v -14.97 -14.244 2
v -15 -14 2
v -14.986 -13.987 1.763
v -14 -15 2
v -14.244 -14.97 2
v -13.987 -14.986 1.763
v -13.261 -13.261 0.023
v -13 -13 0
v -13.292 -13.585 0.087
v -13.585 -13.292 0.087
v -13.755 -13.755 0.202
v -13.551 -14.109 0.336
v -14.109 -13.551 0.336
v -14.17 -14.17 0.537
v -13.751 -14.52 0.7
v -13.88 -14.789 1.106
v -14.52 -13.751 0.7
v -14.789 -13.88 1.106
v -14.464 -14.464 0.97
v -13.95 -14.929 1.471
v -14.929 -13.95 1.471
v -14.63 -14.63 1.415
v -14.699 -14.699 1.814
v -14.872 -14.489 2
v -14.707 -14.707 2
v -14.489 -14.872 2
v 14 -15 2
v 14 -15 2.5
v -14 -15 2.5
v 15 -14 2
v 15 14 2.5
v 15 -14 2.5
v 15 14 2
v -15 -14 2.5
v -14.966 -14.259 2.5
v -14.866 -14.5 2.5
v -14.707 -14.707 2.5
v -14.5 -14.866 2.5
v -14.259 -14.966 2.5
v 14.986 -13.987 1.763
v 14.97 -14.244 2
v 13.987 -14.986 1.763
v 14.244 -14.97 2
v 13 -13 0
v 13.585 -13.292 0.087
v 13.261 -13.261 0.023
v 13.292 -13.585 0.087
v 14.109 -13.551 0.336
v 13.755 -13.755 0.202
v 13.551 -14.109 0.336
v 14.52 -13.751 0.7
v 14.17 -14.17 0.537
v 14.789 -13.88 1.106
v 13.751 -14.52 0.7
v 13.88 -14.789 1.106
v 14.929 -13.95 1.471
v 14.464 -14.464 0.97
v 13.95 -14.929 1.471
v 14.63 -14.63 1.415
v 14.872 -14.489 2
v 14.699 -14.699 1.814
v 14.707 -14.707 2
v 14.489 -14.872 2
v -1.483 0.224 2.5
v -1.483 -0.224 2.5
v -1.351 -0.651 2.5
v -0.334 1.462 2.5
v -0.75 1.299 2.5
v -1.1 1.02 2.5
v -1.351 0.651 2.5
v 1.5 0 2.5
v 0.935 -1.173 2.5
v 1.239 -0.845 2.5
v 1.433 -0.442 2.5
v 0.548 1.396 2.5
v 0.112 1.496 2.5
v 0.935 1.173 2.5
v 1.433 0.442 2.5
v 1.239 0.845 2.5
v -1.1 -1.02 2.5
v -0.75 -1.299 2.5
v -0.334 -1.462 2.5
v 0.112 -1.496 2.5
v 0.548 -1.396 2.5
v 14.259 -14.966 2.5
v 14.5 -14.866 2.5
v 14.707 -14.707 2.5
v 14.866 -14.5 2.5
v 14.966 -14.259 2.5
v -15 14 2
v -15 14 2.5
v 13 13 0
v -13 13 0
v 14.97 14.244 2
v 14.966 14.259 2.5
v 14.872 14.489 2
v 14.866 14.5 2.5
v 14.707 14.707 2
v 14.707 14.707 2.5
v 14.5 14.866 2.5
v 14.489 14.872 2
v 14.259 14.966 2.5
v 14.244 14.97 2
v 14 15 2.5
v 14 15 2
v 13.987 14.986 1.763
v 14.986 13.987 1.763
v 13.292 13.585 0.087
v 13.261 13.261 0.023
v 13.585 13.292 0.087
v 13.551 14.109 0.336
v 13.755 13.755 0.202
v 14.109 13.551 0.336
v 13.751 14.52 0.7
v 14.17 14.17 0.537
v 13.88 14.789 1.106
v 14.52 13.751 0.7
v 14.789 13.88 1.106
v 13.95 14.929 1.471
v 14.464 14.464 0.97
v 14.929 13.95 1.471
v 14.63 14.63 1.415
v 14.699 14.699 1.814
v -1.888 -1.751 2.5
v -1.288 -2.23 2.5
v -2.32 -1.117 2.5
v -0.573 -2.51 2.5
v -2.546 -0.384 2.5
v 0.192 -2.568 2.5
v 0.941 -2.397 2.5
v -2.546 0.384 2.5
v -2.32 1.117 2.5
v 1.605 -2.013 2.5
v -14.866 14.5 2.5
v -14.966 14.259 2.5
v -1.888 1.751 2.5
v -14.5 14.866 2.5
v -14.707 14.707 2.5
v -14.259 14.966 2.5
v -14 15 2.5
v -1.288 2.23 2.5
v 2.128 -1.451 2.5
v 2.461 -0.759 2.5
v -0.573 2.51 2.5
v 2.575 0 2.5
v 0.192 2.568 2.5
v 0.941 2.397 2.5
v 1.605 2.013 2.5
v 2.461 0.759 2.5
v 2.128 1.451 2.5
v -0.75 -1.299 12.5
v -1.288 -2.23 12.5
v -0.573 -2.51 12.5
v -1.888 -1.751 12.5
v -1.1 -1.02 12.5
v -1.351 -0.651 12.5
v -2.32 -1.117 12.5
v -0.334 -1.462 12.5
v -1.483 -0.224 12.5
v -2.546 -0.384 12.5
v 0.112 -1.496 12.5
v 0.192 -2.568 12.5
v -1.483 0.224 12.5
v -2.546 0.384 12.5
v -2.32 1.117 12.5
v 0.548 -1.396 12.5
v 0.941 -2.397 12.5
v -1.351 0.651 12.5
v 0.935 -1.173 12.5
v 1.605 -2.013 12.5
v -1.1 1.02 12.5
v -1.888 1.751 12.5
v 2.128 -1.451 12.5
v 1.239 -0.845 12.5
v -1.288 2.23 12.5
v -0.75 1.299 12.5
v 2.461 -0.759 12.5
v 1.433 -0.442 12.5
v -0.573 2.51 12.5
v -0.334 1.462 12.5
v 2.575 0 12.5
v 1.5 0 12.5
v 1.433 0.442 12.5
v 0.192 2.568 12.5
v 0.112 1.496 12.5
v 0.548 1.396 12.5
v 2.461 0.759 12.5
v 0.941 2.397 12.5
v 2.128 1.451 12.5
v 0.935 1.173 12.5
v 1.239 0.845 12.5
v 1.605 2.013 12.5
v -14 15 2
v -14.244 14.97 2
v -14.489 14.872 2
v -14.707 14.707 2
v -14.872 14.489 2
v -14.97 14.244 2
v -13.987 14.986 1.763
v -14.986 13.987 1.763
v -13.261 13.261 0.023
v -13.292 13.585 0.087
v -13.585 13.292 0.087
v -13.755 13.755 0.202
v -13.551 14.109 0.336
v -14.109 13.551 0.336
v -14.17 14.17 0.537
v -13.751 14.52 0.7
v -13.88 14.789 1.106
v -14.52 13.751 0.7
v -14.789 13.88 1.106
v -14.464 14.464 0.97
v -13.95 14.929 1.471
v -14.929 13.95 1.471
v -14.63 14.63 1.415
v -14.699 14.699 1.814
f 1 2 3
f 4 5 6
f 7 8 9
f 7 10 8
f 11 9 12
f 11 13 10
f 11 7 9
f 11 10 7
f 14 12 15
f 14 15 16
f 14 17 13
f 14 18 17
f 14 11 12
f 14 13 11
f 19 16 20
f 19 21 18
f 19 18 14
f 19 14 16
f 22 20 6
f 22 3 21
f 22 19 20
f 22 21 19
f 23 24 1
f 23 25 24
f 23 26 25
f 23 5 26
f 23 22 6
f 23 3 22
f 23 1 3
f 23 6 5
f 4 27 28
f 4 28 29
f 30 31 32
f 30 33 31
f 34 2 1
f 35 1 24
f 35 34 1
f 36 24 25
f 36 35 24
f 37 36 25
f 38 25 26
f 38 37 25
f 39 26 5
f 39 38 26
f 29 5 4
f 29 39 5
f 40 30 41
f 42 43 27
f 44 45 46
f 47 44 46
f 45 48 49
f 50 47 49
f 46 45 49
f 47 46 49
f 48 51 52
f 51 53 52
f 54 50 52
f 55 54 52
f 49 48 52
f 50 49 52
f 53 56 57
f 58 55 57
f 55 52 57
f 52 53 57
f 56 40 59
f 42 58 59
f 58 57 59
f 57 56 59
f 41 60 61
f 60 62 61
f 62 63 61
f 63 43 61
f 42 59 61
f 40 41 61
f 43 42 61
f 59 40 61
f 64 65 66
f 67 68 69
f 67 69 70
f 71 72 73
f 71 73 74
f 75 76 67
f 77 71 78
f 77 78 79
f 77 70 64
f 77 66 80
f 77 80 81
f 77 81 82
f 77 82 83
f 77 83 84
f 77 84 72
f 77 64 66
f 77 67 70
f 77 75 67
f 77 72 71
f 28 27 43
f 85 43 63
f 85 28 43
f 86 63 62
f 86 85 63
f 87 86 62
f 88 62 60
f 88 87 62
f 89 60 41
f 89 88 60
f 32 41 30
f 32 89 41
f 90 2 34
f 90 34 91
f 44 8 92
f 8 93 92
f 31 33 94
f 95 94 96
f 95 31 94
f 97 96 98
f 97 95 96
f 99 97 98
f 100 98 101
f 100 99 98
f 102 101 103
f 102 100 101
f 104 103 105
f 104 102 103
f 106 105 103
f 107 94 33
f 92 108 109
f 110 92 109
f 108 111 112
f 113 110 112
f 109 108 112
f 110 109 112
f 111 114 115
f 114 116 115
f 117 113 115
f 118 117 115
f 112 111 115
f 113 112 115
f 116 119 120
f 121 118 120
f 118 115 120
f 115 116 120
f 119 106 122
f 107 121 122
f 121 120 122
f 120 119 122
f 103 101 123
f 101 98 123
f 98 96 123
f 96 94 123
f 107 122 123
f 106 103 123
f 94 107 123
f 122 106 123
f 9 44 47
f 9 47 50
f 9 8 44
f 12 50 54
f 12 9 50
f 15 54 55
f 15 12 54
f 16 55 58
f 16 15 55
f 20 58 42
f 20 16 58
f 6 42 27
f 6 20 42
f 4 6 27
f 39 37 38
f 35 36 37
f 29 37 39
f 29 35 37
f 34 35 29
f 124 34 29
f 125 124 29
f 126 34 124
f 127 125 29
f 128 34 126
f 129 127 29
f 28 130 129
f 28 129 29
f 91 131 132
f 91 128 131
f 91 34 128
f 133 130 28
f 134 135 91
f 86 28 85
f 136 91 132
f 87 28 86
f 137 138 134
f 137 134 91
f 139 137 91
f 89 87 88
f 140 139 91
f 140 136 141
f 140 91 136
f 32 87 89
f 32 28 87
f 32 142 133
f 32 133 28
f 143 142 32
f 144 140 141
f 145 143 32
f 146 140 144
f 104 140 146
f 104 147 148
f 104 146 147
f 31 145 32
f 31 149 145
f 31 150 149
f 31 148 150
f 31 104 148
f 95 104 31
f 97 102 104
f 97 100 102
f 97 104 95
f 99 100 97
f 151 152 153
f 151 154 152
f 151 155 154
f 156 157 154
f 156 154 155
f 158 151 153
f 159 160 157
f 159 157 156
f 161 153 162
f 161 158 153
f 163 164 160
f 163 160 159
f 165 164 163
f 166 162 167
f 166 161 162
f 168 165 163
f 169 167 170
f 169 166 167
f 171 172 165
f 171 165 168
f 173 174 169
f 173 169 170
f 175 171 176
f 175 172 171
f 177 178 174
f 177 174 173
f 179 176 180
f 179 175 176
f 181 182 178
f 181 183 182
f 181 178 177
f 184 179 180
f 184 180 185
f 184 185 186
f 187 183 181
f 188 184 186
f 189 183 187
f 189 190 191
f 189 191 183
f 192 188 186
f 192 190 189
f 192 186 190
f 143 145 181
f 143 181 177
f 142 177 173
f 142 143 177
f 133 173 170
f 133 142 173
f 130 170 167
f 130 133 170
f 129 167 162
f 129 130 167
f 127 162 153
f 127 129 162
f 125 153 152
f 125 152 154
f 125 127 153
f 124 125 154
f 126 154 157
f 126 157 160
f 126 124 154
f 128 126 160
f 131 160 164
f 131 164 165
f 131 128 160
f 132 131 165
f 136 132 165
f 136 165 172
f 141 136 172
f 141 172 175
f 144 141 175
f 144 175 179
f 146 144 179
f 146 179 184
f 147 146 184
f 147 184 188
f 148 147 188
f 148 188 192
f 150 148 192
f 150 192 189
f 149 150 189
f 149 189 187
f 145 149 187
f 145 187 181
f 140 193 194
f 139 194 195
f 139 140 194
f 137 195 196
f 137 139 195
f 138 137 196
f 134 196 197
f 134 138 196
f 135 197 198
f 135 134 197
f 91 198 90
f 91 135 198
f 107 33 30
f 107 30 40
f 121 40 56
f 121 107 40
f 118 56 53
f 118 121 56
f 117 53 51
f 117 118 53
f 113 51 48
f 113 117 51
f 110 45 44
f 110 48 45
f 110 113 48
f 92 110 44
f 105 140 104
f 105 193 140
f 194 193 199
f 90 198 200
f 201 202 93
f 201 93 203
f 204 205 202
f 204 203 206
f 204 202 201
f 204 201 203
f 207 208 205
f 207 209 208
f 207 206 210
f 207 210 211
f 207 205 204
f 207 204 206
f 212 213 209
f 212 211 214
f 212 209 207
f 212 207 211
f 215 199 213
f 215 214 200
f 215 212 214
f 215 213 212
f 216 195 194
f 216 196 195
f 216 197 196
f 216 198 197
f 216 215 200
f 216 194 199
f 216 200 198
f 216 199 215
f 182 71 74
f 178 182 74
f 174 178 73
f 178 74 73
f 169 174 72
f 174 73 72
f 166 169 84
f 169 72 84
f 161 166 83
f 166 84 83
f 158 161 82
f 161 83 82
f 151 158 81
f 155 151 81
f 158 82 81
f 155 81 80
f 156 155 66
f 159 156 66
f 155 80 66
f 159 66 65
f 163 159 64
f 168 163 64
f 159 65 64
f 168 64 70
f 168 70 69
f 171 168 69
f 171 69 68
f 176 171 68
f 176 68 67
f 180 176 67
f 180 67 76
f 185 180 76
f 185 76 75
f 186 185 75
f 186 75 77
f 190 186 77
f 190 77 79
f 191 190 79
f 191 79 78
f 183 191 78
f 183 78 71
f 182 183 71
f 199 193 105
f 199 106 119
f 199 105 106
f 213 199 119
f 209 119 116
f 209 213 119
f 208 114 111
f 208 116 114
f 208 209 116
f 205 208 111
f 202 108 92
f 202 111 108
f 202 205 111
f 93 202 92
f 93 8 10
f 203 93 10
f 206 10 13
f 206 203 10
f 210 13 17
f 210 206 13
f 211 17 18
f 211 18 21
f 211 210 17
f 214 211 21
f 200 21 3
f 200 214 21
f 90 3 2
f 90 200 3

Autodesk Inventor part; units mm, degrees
ref_plane "YZ Plane" through (0, 0, 0) normal (1, 0, 0) x (0, 1, 0)
ref_plane "XZ Plane" through (0, 0, 0) normal (0, 1, 0) x (-1, 0, 0)
ref_plane "XY Plane" through (0, 0, 0) normal (0, 0, 1) x (1, 0, 0)
sketch "Náčrt1" plane through (0, 0, 0) normal (0, 0, 1) x (1, 0, 0)
  line L0 (0, 21) -> (0, -21) projected
  line L1 (-21, 0) -> (21, 0) projected
  line L2 (-15, 15) -> (15, 15)
  line L3 (15, 15) -> (15, -15)
  line L4 (15, -15) -> (-15, -15)
  line L5 (-15, -15) -> (-15, 15)
  point P0 (0, 0)
  dimension "d0" = 30
  dimension "d1" = 30
extrude "Vysunutí1" add sketch "Náčrt1" along normal blind 2.5
sketch "Náčrt2" plane through (0, 0, 2.5) normal (0, 0, 1) x (1, 0, 0)
  line L0 (-15, -15) -> (15, -15) projected
  line L1 (15, -15) -> (15, 15) projected
  line L2 (15, 15) -> (-15, 15) projected
  line L3 (-15, 15) -> (-15, -15) projected
  line L4 (0, 21) -> (0, -21) projected
  line L5 (-21, 0) -> (21, 0) projected
  circle A0 centre (0, 0) radius 2.575
  circle A1 centre (0, 0) radius 1.5
  dimension "d5" = 5.15
  dimension "d6" = 3
extrude "Vysunutí2" add sketch "Náčrt2" along normal blind 10 contours A0 L5 A1 L4 | L4 A1 L5 A0 | A0 L4 A1 L5 | L5 A1 L4 A0
fillet "Zaoblení1" radius 2 4 edges at (15, 0, 0) (0, 15, 0) (-15, 0, 0) (0, -15, 0)
fillet "Zaoblení2" radius 1 8 edges at (15, -15, 2.25) (14.4142, -14.4142, 0.5858) (15, 15, 2.25) (14.4142, 14.4142, 0.5858) (-15, 15, 2.25) (-14.4142, 14.4142, 0.5858) (-15, -15, 2.25) (-14.4142, -14.4142, 0.5858)
properties part number "záslepka"
